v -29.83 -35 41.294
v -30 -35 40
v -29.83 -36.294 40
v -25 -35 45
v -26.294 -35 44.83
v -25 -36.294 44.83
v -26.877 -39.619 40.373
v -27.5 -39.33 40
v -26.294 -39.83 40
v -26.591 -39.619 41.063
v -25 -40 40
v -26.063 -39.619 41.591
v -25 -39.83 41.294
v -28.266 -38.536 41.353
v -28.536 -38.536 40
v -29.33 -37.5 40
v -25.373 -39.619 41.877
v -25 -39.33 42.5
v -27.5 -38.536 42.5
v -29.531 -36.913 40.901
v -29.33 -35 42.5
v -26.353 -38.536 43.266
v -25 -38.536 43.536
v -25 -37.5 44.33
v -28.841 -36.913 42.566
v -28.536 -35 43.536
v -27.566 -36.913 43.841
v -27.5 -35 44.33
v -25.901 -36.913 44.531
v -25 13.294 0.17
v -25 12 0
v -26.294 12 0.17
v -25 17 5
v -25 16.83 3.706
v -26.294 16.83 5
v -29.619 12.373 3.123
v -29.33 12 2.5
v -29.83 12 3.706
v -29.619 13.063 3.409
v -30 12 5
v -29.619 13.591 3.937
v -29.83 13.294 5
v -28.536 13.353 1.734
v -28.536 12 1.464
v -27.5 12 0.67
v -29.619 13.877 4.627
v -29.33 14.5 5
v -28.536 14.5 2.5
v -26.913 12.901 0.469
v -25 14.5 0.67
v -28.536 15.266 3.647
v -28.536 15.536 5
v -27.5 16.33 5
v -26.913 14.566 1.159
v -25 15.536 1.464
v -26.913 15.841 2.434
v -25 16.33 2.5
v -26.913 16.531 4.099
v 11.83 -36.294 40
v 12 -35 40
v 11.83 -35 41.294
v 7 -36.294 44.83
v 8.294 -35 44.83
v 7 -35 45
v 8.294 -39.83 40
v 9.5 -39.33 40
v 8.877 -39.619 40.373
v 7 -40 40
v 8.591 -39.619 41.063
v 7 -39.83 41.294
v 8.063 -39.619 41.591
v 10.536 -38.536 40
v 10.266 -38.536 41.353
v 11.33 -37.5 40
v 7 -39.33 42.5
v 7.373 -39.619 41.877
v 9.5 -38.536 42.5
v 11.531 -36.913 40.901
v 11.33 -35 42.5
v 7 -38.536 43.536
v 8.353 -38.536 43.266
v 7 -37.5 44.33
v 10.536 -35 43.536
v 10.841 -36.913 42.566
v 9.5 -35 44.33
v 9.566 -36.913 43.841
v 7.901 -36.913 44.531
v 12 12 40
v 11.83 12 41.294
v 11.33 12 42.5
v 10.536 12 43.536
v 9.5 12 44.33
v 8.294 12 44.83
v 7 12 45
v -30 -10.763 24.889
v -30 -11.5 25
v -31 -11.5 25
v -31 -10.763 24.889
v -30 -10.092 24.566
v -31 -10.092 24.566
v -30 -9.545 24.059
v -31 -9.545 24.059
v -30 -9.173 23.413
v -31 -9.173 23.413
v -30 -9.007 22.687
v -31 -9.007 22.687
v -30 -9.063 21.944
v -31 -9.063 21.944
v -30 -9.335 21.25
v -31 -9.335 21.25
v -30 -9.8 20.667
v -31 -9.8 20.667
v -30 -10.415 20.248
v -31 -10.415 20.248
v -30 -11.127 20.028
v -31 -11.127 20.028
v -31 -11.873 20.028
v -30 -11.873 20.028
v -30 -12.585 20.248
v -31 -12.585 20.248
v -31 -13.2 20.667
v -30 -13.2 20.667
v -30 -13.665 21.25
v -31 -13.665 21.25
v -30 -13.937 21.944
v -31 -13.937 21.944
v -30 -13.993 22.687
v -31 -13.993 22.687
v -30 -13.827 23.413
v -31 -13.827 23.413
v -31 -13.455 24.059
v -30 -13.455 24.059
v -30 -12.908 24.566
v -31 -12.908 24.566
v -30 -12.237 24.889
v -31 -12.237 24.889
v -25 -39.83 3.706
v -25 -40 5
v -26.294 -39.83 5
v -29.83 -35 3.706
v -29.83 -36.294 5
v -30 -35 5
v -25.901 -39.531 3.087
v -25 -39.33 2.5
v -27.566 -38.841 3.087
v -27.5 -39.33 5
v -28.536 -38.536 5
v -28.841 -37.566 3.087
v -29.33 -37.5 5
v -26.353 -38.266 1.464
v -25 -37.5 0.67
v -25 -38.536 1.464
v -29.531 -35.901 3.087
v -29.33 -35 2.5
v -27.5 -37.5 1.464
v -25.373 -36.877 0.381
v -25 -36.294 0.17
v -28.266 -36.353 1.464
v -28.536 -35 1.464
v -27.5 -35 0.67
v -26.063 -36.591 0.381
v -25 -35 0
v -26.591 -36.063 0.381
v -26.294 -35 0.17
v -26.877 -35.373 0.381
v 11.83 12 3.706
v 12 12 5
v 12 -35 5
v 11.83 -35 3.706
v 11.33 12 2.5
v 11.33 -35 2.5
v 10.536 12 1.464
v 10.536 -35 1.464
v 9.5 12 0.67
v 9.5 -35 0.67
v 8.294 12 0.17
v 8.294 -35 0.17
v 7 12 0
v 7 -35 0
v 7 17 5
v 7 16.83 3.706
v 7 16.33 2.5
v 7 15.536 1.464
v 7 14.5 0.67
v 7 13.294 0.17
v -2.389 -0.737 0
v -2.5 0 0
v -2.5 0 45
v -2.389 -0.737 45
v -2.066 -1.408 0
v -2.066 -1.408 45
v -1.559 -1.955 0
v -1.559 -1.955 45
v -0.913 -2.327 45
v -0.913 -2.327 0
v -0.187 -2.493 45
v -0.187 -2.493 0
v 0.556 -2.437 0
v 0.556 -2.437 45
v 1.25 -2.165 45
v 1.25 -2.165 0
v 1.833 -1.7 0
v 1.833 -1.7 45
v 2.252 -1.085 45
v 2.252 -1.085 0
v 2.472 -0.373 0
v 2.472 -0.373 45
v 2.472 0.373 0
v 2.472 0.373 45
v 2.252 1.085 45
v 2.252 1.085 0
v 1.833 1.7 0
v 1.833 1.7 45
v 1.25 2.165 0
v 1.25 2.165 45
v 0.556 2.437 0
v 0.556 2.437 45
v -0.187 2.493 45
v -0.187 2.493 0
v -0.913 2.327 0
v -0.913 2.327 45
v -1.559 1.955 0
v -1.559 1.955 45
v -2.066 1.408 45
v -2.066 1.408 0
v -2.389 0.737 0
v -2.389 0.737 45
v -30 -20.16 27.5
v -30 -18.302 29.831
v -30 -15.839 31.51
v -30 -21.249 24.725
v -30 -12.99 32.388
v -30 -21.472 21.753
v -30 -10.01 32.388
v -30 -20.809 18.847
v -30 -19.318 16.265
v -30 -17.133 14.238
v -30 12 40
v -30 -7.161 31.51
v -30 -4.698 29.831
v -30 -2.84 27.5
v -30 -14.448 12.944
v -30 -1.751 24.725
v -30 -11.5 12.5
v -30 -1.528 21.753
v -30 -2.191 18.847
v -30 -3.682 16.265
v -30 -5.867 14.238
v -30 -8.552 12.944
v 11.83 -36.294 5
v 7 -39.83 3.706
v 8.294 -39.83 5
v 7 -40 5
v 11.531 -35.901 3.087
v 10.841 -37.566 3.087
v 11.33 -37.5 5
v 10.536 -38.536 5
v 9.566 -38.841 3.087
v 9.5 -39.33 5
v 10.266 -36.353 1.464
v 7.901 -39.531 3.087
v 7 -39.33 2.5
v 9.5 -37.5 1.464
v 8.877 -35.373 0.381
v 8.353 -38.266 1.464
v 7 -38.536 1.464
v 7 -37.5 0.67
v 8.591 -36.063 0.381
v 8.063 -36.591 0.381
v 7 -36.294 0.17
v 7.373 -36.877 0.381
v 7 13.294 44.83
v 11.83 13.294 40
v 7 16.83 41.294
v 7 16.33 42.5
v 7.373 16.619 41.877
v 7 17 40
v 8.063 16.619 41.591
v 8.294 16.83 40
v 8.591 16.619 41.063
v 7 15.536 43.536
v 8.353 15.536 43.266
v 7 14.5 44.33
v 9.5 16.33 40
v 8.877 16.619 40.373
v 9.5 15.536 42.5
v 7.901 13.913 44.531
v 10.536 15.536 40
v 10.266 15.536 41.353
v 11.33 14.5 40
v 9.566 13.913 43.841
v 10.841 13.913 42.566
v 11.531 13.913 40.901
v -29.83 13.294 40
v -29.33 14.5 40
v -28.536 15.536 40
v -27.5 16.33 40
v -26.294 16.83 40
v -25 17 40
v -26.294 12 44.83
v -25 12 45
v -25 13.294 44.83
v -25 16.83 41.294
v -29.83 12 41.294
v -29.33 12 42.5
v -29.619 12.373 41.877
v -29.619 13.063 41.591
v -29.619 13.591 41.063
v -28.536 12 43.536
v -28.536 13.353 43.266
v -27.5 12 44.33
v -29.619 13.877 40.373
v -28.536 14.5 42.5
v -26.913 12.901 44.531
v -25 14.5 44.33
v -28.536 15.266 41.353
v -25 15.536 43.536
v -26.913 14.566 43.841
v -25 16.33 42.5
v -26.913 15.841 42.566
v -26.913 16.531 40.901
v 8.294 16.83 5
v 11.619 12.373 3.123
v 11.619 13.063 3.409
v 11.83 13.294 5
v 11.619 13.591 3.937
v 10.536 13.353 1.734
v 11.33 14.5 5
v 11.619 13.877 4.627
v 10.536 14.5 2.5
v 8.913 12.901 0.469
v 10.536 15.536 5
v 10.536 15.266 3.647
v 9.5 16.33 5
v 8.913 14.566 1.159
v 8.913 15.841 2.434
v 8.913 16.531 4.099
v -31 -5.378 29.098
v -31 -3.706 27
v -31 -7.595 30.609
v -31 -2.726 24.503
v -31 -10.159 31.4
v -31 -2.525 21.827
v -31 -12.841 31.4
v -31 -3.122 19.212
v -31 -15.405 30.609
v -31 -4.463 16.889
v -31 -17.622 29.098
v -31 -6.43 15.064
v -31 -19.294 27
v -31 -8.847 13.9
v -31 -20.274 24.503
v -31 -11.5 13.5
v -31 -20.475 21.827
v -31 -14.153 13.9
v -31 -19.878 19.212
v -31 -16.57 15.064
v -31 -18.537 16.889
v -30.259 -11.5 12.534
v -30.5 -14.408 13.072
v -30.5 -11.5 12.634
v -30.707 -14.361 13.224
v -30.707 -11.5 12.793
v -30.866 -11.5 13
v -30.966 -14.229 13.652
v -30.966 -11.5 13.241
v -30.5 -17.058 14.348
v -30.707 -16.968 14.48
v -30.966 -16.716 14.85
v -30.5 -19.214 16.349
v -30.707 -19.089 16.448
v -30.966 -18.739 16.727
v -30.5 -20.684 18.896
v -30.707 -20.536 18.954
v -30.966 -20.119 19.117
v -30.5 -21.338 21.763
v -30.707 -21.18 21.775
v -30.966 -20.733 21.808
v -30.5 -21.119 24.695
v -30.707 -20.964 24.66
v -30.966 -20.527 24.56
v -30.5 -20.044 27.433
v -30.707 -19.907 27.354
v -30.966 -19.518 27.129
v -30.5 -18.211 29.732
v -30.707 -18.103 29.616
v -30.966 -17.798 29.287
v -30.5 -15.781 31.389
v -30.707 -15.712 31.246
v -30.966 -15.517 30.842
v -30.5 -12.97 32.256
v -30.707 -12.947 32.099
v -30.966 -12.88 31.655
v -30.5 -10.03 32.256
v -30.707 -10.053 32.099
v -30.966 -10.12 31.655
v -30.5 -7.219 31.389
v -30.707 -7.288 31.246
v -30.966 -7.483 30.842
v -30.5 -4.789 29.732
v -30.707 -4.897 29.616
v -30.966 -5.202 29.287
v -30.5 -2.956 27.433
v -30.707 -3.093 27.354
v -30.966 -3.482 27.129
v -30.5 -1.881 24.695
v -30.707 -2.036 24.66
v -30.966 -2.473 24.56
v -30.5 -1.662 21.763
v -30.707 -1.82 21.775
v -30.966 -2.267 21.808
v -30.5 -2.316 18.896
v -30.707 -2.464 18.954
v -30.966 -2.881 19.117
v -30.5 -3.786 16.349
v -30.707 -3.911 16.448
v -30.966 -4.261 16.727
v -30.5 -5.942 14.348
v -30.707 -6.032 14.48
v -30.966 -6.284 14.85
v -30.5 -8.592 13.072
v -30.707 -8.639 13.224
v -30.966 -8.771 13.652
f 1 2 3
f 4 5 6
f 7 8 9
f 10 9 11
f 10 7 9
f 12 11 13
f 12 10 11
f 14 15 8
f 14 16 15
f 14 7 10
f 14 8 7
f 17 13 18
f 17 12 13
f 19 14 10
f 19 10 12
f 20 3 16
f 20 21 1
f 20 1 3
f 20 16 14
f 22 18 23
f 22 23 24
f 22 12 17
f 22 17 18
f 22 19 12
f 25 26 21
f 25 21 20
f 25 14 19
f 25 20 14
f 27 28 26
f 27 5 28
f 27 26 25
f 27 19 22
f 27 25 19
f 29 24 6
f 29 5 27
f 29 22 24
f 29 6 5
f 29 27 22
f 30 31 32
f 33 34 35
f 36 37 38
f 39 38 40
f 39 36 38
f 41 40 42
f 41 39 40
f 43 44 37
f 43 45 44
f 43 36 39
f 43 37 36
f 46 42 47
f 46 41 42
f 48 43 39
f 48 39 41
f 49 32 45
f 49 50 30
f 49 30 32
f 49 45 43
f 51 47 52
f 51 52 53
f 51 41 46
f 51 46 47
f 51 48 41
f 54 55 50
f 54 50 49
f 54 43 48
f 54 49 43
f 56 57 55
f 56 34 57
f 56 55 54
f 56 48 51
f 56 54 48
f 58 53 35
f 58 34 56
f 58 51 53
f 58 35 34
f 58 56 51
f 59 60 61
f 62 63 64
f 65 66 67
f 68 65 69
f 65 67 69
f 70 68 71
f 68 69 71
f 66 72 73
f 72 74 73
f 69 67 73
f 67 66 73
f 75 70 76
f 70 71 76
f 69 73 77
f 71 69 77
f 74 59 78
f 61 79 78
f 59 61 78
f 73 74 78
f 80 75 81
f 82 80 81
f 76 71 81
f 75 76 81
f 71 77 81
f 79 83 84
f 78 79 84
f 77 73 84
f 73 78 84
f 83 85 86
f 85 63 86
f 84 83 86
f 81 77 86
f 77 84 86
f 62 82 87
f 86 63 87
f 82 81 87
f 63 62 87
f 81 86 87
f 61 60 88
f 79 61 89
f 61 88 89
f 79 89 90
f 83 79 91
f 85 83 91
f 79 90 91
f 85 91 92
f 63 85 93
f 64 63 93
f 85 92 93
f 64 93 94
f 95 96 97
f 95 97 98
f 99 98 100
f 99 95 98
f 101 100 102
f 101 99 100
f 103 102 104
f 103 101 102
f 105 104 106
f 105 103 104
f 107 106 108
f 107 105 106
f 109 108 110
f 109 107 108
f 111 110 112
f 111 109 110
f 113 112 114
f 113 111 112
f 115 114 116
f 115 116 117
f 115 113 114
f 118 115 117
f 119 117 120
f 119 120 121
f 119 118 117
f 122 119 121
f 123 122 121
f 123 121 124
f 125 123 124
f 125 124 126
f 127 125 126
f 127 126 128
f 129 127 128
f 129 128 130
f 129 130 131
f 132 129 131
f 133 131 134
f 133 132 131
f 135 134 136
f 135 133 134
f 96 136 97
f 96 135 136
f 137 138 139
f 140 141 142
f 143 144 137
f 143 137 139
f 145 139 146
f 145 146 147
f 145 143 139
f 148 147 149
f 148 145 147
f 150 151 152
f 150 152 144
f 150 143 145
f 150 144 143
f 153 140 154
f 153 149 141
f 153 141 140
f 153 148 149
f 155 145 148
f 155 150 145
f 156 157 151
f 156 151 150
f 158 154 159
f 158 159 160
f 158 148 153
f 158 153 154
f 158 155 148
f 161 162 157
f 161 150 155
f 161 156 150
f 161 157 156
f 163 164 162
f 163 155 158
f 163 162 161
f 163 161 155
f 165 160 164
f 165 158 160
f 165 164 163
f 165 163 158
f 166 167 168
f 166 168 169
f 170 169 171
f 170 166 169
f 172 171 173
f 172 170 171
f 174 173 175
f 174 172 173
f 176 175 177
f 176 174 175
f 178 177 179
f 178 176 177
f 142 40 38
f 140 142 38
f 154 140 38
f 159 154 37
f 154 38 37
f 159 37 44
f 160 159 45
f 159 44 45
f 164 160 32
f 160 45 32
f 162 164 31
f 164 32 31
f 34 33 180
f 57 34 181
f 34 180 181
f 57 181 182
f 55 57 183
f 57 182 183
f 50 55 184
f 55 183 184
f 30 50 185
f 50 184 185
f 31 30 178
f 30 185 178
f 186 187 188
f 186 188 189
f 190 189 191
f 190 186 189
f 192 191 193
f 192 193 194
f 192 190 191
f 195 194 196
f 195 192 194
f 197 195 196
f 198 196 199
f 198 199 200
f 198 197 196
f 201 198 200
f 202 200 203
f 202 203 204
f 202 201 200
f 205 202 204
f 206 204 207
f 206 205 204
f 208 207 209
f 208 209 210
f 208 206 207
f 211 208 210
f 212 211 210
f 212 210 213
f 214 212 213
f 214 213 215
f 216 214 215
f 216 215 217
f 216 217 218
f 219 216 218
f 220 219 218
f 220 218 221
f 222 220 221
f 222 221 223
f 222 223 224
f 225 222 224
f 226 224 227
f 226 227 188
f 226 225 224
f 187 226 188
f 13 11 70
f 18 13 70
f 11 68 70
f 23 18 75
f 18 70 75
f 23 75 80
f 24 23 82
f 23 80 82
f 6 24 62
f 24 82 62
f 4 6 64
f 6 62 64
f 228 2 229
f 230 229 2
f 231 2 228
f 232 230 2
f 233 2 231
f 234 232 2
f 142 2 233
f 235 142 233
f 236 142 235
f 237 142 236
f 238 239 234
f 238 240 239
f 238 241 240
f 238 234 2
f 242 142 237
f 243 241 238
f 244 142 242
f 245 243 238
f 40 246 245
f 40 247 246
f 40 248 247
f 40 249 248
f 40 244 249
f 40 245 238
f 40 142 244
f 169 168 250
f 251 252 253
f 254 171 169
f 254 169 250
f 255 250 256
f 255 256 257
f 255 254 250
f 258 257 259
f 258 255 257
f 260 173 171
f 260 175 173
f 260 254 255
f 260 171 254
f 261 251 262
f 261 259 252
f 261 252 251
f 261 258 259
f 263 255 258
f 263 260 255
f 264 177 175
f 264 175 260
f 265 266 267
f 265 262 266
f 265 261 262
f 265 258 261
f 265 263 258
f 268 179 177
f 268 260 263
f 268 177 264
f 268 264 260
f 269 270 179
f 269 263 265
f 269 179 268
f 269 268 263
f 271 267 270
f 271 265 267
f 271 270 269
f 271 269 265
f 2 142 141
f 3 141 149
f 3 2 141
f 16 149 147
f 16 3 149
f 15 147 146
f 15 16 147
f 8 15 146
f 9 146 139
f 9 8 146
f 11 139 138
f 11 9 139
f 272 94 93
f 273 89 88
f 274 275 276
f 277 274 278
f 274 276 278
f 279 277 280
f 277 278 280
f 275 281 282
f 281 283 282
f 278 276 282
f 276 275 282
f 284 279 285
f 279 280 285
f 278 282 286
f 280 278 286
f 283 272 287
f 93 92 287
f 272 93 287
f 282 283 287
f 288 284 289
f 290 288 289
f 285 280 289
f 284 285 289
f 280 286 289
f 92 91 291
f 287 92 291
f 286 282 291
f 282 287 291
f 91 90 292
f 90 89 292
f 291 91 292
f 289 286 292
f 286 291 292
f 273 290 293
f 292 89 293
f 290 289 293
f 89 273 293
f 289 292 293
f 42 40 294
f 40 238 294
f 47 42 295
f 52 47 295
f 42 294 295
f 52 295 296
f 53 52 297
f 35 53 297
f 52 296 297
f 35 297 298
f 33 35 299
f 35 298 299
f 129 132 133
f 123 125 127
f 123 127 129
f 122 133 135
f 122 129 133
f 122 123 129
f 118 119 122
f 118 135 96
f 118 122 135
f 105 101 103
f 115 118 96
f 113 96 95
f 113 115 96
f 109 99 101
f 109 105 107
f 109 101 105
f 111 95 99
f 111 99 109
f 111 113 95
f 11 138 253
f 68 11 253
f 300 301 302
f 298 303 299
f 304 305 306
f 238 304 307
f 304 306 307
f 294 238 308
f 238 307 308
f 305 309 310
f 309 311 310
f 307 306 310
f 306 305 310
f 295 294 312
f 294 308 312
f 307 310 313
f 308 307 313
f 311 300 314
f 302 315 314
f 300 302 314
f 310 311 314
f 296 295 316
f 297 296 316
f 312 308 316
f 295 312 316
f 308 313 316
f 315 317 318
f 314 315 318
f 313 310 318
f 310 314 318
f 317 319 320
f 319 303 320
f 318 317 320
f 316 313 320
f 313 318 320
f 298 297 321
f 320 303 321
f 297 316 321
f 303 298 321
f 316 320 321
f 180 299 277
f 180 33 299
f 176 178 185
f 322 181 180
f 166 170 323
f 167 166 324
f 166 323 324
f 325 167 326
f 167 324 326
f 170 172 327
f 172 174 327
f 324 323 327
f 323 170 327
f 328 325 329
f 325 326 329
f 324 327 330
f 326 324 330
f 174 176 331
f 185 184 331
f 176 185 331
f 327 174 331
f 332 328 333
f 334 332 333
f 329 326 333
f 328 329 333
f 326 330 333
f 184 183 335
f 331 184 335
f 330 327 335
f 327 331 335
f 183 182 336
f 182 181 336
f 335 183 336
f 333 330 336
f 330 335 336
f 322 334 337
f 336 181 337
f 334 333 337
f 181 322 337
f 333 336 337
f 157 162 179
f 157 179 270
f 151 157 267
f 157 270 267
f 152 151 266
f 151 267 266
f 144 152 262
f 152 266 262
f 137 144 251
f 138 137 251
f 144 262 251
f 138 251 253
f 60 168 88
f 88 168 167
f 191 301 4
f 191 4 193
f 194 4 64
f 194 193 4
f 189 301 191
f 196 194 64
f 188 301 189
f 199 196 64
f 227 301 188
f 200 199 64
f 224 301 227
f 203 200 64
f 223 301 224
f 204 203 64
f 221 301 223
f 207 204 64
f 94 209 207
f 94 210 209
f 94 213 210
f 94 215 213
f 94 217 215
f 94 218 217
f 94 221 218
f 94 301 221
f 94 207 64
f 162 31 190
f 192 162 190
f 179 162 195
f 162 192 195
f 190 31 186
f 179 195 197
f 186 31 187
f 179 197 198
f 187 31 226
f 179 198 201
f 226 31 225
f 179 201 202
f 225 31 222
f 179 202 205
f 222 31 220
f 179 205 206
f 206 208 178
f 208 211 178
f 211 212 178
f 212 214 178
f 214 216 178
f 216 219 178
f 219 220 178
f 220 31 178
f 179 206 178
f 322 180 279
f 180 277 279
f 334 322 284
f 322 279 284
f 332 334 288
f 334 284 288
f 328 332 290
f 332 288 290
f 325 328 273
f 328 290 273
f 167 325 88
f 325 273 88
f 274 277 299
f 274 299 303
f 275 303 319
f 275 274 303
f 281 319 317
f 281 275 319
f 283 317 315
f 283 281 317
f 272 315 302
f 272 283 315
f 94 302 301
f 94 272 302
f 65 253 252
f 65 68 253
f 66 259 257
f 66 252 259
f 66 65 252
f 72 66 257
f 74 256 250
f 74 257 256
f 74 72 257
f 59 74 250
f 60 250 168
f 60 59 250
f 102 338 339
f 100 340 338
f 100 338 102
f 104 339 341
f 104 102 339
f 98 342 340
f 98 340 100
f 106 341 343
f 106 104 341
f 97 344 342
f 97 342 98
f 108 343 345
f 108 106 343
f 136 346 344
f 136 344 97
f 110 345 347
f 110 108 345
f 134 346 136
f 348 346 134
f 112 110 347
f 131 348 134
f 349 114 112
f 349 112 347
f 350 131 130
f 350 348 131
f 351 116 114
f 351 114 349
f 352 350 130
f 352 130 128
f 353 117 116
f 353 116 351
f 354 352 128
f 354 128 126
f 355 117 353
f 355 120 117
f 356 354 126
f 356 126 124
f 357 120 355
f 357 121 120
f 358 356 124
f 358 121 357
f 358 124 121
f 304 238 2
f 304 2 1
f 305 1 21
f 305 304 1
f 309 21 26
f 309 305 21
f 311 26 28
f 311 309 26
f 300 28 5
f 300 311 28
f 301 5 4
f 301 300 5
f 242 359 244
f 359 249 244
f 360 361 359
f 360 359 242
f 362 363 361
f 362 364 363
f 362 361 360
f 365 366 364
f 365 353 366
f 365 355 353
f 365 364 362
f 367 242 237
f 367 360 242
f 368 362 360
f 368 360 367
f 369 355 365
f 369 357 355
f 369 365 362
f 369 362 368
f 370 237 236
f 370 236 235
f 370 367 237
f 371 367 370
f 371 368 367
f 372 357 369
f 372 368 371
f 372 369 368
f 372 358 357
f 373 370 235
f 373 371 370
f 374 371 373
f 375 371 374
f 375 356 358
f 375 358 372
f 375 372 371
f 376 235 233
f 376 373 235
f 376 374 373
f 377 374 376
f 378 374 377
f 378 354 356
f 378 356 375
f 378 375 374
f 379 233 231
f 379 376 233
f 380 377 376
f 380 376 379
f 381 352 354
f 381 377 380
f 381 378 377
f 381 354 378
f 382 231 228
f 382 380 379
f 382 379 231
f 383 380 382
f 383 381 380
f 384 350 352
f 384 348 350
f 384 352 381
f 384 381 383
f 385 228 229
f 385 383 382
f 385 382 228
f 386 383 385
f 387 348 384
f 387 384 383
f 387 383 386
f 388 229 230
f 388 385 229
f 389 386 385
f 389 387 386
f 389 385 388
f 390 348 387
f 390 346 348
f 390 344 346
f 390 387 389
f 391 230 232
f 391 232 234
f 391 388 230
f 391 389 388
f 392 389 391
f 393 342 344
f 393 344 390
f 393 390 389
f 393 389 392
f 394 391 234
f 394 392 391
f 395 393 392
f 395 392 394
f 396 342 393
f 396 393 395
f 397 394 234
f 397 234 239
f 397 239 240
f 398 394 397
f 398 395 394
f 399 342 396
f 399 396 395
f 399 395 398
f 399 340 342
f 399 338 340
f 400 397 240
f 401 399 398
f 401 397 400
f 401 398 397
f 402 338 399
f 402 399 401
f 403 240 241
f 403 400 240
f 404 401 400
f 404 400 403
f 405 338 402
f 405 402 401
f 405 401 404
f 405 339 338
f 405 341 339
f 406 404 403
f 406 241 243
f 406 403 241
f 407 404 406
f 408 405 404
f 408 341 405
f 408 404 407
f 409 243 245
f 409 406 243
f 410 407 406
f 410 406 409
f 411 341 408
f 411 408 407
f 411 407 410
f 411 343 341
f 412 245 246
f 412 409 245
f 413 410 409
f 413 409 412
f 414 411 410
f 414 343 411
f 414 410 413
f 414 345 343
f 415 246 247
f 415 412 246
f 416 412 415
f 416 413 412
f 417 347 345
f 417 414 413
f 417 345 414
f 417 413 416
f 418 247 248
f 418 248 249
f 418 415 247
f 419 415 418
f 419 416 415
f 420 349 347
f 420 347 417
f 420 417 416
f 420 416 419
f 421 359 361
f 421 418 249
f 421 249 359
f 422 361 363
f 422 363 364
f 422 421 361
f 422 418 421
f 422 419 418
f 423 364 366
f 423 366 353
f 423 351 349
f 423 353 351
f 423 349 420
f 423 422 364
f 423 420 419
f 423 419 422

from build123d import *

# Parameters (mm, degrees)
SKETCH1_W           = 42
SKETCH1_H           = 57
SKETCH1_R           = 2.5
BOSS_EXTRUDE1_DEPTH = 45
FILLET1_R           = 5
FILLET2_R           = 5
SKETCH2_R           = 10
SKETCH2_R_2         = 2.5
BOSS_EXTRUDE2_DEPTH = 1
FILLET3_R           = 1


# Some blends are built 0.0001 mm under size
with BuildPart() as part:
    # Sketch1 → Boss-Extrude1 (new body)
    with BuildSketch(Plane.XY):
        with Locations((-9, -11.5)):
            Rectangle(SKETCH1_W, SKETCH1_H)
        with Locations(Location((0, 0, 0), (0, 0, 180))):
            Circle(SKETCH1_R, mode=Mode.SUBTRACT)
    extrude(amount=BOSS_EXTRUDE1_DEPTH)

    # Fillet1
    fillet1_edges = [part.edges().sort_by_distance(p)[0] for p in [
        (12, -11.5, 45),
        (-9, 17, 45),
        (-30, -11.5, 45),
        (-9, 17, 0),
        (12, -11.5, 0),
        (-30, -11.5, 0),
        (-30, 17, 22.5),
        (12, 17, 22.5),
        (12, -40, 22.5),
        (-30, -40, 22.5),
        (-9, -40, 45),
    ]]
    fillet(fillet1_edges, radius=FILLET1_R)

    # Fillet2
    # the kernel refuses this fillet: 5 mm, written as the material it takes off along each edge
    with BuildSketch(Plane(origin=(7, -35, 5), x_dir=(0, -1, 0), z_dir=(0, 0, -1))) as fillet2_piece_1_section:
        Polygon((0, 0), (FILLET2_R, 0), (FILLET2_R, -FILLET2_R), (0, -FILLET2_R), align=None)
    fillet2_piece_1 = extrude(amount=FILLET2_R, mode=Mode.PRIVATE)
    fillet2_piece_1 = fillet2_piece_1 - Plane(origin=(7, -35, 5), x_dir=(-0.7071067811865477, 0.7071067811865474, 0), z_dir=(0, 0, -1)) * Sphere(FILLET2_R, mode=Mode.PRIVATE)
    add(fillet2_piece_1, mode=Mode.SUBTRACT)
    with BuildSketch(Plane(origin=(-25, -35, 5), x_dir=(0, -1, 0), z_dir=(0, 0, -1))) as fillet2_piece_2_section:
        Polygon((0, 0), (FILLET2_R, 0), (FILLET2_R, FILLET2_R), (0, FILLET2_R), align=None)
    fillet2_piece_2 = extrude(amount=FILLET2_R, mode=Mode.PRIVATE)
    fillet2_piece_2 = fillet2_piece_2 - Plane(origin=(-25, -35, 5), x_dir=(0.7071067811865474, 0.7071067811865476, 0), z_dir=(0, 0, -1)) * Sphere(FILLET2_R, mode=Mode.PRIVATE)
    add(fillet2_piece_2, mode=Mode.SUBTRACT)
    with BuildSketch(Plane(origin=(7, -40, 0), x_dir=(0, 1, 0), z_dir=(-1, 0, 0))) as fillet2_piece_3:
        with BuildLine():
            CenterArc((FILLET2_R, -FILLET2_R), FILLET2_R, 90, 90)
            Line((0, -FILLET2_R), (0, 0))
            Line((0, 0), (FILLET2_R, 0))
        make_face()
    extrude(amount=32, mode=Mode.SUBTRACT)

    # Sketch2 → Boss-Extrude2 (add)
    with BuildSketch(Plane.ZY.offset(30)):
        with Locations(Location((22.5, -11.5, 0), (0, 0, 180))):
            Circle(SKETCH2_R)
        with Locations((22.5, -11.5)):
            Circle(SKETCH2_R_2, mode=Mode.SUBTRACT)
    extrude(amount=BOSS_EXTRUDE2_DEPTH)

    # Fillet3
    fillet3_edges = [part.edges().sort_by_distance(p)[0] for p in [
        (-31, -11.5, 32.5),
    ]]
    fillet(fillet3_edges, radius=FILLET3_R - 0.0001)  # a hair under: the kernel refuses the full size


solid = part.part
